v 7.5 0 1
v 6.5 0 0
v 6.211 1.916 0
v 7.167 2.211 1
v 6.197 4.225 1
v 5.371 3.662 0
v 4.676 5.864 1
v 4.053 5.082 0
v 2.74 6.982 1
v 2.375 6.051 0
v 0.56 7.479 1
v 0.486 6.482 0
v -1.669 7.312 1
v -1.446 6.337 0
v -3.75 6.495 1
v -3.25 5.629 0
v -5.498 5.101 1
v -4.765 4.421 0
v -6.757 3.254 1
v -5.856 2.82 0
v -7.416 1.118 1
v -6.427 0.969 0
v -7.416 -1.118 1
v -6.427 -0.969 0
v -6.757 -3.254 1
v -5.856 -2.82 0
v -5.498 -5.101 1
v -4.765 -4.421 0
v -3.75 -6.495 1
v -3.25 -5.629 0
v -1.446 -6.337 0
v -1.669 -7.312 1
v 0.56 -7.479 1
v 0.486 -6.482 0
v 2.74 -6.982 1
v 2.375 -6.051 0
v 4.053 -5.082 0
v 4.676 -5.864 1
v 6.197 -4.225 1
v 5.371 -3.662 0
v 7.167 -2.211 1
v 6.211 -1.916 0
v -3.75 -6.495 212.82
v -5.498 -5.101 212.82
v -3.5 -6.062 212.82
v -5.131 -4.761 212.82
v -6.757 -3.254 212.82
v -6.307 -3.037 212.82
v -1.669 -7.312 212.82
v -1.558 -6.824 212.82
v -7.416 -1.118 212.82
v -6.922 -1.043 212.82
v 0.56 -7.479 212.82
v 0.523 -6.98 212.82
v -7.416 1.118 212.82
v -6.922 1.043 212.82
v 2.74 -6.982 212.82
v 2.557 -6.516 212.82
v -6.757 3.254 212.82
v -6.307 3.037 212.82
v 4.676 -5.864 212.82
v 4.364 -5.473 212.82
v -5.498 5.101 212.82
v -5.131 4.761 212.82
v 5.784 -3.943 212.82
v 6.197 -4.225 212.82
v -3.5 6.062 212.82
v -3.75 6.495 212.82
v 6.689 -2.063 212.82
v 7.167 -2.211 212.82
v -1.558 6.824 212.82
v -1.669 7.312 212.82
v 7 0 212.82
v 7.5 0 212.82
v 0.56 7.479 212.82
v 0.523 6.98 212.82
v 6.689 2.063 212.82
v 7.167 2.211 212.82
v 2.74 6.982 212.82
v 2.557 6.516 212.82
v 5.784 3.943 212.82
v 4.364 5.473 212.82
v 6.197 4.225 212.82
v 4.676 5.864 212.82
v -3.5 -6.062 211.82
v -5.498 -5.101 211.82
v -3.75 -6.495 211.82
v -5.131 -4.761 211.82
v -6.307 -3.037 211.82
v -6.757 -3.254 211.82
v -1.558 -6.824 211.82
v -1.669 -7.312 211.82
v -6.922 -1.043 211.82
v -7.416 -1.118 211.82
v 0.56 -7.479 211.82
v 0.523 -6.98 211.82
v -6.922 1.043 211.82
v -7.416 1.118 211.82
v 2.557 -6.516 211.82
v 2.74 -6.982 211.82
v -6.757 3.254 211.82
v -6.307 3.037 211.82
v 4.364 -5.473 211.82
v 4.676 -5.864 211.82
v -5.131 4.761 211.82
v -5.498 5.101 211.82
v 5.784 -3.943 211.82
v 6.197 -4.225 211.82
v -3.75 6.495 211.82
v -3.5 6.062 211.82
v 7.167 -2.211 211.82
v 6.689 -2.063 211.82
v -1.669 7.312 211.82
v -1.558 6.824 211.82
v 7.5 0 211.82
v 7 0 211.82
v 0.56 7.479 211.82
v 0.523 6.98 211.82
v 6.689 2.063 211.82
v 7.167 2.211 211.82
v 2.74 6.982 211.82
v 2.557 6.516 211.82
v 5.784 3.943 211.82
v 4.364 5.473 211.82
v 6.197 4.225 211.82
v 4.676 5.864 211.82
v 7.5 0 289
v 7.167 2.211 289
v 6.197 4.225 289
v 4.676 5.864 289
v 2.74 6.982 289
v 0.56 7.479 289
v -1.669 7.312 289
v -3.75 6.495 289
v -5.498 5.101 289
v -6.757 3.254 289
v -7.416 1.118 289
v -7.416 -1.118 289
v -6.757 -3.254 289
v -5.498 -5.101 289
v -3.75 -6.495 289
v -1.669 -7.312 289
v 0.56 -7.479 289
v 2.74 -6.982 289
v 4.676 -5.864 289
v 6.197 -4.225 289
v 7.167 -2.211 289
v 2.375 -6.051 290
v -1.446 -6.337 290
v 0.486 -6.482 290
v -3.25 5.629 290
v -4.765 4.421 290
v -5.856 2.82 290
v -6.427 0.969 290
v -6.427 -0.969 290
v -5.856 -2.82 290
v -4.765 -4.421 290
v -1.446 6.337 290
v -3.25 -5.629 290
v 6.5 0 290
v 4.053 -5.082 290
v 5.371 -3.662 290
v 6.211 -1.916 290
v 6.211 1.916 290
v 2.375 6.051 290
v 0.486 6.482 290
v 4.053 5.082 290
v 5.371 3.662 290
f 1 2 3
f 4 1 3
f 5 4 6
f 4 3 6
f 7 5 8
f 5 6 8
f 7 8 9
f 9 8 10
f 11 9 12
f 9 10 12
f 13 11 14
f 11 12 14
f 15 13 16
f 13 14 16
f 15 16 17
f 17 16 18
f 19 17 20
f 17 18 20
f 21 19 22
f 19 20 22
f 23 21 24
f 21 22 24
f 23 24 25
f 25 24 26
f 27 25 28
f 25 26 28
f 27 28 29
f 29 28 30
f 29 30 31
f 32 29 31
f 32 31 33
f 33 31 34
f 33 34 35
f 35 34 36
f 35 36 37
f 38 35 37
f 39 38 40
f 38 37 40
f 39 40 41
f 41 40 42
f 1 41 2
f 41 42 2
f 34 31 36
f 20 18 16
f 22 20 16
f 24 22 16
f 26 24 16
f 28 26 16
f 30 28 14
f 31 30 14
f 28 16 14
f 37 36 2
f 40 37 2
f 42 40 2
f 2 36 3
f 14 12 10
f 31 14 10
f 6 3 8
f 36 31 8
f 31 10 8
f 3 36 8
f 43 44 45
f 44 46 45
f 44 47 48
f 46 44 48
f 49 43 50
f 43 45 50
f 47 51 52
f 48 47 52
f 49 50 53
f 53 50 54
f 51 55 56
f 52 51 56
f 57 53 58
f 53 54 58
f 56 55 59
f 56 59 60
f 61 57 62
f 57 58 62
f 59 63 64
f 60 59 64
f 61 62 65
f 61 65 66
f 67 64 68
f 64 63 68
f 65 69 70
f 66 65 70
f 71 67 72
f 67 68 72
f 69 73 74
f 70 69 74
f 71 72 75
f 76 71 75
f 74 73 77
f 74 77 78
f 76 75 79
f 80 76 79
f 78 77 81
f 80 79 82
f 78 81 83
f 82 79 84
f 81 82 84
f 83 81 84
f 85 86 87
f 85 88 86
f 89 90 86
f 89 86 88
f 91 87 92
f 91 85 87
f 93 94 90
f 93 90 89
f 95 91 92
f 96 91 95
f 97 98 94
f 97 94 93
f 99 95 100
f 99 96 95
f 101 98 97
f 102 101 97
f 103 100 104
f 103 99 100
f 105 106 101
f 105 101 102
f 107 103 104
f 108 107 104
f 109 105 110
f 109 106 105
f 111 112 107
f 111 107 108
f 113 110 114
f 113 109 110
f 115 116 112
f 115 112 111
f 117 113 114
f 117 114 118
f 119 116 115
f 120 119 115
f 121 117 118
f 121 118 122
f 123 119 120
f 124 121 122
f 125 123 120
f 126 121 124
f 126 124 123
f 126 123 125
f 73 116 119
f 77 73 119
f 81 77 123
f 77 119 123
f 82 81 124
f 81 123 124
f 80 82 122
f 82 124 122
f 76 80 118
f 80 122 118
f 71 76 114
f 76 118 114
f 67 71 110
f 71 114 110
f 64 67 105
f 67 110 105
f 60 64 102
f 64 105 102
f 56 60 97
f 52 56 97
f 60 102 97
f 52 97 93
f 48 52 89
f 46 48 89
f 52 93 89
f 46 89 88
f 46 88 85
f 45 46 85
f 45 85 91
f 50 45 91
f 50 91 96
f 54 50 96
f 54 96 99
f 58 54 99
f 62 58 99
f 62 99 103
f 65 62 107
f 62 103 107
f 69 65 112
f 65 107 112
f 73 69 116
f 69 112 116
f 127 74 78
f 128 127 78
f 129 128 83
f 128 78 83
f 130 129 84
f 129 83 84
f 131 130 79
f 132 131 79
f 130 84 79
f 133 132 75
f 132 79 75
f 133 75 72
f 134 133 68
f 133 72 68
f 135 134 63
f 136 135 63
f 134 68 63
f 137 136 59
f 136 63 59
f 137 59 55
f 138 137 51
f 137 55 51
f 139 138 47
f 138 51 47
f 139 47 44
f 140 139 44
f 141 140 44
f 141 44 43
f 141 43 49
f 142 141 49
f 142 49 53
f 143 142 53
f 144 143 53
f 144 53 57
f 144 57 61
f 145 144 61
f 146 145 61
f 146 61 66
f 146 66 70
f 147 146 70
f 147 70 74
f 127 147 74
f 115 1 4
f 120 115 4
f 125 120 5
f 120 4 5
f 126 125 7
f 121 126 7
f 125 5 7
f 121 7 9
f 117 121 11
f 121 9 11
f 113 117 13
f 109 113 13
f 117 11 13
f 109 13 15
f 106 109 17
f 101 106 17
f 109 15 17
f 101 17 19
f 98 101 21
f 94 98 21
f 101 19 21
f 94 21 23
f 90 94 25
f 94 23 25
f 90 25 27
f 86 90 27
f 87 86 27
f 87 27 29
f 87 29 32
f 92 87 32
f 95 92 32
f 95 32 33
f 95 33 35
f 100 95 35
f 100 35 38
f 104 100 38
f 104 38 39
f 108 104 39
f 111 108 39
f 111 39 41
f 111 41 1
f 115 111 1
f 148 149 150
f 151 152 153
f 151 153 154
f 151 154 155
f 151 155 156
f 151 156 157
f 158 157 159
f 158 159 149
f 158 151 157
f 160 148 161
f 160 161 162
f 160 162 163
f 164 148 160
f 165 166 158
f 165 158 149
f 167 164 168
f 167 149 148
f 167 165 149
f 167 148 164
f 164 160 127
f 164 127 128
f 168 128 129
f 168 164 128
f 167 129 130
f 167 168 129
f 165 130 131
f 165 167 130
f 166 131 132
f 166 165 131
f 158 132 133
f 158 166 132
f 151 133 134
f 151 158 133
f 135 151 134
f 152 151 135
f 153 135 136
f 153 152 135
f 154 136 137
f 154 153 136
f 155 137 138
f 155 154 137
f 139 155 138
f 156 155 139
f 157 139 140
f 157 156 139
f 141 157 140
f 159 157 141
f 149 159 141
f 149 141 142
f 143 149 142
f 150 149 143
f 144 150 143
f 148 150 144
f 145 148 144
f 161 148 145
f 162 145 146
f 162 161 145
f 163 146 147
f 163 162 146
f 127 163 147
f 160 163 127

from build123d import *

# Parameters (mm, degrees)
SKETCH1_R           = 7.5
BOSS_EXTRUDE1_DEPTH = 290
CHAMFER1_SIZE       = 1
CUT_EXTRUDE1_START  = -1
SKETCH2_R           = 7.5
SKETCH2_R_2         = 7
CUT_EXTRUDE1_DEPTH  = 1


with BuildPart() as part:
    # Sketch1 → Boss-Extrude1 (new body)
    with BuildSketch(Plane.XY):
        Circle(SKETCH1_R)
    extrude(amount=BOSS_EXTRUDE1_DEPTH)

    # Chamfer1
    chamfer1_edges = [part.edges().sort_by_distance(p)[0] for p in [
        (-7.5, 0, 0),
        (-7.5, 0, 290),
    ]]
    chamfer(chamfer1_edges, length=CHAMFER1_SIZE)

    # Sketch2 → Cut-Extrude1 (cut)
    with BuildSketch(Plane.XY.offset(212.82).offset(CUT_EXTRUDE1_START)):
        Circle(SKETCH2_R)
        Circle(SKETCH2_R_2, mode=Mode.SUBTRACT)
    extrude(amount=CUT_EXTRUDE1_DEPTH, mode=Mode.SUBTRACT)


solid = part.part
